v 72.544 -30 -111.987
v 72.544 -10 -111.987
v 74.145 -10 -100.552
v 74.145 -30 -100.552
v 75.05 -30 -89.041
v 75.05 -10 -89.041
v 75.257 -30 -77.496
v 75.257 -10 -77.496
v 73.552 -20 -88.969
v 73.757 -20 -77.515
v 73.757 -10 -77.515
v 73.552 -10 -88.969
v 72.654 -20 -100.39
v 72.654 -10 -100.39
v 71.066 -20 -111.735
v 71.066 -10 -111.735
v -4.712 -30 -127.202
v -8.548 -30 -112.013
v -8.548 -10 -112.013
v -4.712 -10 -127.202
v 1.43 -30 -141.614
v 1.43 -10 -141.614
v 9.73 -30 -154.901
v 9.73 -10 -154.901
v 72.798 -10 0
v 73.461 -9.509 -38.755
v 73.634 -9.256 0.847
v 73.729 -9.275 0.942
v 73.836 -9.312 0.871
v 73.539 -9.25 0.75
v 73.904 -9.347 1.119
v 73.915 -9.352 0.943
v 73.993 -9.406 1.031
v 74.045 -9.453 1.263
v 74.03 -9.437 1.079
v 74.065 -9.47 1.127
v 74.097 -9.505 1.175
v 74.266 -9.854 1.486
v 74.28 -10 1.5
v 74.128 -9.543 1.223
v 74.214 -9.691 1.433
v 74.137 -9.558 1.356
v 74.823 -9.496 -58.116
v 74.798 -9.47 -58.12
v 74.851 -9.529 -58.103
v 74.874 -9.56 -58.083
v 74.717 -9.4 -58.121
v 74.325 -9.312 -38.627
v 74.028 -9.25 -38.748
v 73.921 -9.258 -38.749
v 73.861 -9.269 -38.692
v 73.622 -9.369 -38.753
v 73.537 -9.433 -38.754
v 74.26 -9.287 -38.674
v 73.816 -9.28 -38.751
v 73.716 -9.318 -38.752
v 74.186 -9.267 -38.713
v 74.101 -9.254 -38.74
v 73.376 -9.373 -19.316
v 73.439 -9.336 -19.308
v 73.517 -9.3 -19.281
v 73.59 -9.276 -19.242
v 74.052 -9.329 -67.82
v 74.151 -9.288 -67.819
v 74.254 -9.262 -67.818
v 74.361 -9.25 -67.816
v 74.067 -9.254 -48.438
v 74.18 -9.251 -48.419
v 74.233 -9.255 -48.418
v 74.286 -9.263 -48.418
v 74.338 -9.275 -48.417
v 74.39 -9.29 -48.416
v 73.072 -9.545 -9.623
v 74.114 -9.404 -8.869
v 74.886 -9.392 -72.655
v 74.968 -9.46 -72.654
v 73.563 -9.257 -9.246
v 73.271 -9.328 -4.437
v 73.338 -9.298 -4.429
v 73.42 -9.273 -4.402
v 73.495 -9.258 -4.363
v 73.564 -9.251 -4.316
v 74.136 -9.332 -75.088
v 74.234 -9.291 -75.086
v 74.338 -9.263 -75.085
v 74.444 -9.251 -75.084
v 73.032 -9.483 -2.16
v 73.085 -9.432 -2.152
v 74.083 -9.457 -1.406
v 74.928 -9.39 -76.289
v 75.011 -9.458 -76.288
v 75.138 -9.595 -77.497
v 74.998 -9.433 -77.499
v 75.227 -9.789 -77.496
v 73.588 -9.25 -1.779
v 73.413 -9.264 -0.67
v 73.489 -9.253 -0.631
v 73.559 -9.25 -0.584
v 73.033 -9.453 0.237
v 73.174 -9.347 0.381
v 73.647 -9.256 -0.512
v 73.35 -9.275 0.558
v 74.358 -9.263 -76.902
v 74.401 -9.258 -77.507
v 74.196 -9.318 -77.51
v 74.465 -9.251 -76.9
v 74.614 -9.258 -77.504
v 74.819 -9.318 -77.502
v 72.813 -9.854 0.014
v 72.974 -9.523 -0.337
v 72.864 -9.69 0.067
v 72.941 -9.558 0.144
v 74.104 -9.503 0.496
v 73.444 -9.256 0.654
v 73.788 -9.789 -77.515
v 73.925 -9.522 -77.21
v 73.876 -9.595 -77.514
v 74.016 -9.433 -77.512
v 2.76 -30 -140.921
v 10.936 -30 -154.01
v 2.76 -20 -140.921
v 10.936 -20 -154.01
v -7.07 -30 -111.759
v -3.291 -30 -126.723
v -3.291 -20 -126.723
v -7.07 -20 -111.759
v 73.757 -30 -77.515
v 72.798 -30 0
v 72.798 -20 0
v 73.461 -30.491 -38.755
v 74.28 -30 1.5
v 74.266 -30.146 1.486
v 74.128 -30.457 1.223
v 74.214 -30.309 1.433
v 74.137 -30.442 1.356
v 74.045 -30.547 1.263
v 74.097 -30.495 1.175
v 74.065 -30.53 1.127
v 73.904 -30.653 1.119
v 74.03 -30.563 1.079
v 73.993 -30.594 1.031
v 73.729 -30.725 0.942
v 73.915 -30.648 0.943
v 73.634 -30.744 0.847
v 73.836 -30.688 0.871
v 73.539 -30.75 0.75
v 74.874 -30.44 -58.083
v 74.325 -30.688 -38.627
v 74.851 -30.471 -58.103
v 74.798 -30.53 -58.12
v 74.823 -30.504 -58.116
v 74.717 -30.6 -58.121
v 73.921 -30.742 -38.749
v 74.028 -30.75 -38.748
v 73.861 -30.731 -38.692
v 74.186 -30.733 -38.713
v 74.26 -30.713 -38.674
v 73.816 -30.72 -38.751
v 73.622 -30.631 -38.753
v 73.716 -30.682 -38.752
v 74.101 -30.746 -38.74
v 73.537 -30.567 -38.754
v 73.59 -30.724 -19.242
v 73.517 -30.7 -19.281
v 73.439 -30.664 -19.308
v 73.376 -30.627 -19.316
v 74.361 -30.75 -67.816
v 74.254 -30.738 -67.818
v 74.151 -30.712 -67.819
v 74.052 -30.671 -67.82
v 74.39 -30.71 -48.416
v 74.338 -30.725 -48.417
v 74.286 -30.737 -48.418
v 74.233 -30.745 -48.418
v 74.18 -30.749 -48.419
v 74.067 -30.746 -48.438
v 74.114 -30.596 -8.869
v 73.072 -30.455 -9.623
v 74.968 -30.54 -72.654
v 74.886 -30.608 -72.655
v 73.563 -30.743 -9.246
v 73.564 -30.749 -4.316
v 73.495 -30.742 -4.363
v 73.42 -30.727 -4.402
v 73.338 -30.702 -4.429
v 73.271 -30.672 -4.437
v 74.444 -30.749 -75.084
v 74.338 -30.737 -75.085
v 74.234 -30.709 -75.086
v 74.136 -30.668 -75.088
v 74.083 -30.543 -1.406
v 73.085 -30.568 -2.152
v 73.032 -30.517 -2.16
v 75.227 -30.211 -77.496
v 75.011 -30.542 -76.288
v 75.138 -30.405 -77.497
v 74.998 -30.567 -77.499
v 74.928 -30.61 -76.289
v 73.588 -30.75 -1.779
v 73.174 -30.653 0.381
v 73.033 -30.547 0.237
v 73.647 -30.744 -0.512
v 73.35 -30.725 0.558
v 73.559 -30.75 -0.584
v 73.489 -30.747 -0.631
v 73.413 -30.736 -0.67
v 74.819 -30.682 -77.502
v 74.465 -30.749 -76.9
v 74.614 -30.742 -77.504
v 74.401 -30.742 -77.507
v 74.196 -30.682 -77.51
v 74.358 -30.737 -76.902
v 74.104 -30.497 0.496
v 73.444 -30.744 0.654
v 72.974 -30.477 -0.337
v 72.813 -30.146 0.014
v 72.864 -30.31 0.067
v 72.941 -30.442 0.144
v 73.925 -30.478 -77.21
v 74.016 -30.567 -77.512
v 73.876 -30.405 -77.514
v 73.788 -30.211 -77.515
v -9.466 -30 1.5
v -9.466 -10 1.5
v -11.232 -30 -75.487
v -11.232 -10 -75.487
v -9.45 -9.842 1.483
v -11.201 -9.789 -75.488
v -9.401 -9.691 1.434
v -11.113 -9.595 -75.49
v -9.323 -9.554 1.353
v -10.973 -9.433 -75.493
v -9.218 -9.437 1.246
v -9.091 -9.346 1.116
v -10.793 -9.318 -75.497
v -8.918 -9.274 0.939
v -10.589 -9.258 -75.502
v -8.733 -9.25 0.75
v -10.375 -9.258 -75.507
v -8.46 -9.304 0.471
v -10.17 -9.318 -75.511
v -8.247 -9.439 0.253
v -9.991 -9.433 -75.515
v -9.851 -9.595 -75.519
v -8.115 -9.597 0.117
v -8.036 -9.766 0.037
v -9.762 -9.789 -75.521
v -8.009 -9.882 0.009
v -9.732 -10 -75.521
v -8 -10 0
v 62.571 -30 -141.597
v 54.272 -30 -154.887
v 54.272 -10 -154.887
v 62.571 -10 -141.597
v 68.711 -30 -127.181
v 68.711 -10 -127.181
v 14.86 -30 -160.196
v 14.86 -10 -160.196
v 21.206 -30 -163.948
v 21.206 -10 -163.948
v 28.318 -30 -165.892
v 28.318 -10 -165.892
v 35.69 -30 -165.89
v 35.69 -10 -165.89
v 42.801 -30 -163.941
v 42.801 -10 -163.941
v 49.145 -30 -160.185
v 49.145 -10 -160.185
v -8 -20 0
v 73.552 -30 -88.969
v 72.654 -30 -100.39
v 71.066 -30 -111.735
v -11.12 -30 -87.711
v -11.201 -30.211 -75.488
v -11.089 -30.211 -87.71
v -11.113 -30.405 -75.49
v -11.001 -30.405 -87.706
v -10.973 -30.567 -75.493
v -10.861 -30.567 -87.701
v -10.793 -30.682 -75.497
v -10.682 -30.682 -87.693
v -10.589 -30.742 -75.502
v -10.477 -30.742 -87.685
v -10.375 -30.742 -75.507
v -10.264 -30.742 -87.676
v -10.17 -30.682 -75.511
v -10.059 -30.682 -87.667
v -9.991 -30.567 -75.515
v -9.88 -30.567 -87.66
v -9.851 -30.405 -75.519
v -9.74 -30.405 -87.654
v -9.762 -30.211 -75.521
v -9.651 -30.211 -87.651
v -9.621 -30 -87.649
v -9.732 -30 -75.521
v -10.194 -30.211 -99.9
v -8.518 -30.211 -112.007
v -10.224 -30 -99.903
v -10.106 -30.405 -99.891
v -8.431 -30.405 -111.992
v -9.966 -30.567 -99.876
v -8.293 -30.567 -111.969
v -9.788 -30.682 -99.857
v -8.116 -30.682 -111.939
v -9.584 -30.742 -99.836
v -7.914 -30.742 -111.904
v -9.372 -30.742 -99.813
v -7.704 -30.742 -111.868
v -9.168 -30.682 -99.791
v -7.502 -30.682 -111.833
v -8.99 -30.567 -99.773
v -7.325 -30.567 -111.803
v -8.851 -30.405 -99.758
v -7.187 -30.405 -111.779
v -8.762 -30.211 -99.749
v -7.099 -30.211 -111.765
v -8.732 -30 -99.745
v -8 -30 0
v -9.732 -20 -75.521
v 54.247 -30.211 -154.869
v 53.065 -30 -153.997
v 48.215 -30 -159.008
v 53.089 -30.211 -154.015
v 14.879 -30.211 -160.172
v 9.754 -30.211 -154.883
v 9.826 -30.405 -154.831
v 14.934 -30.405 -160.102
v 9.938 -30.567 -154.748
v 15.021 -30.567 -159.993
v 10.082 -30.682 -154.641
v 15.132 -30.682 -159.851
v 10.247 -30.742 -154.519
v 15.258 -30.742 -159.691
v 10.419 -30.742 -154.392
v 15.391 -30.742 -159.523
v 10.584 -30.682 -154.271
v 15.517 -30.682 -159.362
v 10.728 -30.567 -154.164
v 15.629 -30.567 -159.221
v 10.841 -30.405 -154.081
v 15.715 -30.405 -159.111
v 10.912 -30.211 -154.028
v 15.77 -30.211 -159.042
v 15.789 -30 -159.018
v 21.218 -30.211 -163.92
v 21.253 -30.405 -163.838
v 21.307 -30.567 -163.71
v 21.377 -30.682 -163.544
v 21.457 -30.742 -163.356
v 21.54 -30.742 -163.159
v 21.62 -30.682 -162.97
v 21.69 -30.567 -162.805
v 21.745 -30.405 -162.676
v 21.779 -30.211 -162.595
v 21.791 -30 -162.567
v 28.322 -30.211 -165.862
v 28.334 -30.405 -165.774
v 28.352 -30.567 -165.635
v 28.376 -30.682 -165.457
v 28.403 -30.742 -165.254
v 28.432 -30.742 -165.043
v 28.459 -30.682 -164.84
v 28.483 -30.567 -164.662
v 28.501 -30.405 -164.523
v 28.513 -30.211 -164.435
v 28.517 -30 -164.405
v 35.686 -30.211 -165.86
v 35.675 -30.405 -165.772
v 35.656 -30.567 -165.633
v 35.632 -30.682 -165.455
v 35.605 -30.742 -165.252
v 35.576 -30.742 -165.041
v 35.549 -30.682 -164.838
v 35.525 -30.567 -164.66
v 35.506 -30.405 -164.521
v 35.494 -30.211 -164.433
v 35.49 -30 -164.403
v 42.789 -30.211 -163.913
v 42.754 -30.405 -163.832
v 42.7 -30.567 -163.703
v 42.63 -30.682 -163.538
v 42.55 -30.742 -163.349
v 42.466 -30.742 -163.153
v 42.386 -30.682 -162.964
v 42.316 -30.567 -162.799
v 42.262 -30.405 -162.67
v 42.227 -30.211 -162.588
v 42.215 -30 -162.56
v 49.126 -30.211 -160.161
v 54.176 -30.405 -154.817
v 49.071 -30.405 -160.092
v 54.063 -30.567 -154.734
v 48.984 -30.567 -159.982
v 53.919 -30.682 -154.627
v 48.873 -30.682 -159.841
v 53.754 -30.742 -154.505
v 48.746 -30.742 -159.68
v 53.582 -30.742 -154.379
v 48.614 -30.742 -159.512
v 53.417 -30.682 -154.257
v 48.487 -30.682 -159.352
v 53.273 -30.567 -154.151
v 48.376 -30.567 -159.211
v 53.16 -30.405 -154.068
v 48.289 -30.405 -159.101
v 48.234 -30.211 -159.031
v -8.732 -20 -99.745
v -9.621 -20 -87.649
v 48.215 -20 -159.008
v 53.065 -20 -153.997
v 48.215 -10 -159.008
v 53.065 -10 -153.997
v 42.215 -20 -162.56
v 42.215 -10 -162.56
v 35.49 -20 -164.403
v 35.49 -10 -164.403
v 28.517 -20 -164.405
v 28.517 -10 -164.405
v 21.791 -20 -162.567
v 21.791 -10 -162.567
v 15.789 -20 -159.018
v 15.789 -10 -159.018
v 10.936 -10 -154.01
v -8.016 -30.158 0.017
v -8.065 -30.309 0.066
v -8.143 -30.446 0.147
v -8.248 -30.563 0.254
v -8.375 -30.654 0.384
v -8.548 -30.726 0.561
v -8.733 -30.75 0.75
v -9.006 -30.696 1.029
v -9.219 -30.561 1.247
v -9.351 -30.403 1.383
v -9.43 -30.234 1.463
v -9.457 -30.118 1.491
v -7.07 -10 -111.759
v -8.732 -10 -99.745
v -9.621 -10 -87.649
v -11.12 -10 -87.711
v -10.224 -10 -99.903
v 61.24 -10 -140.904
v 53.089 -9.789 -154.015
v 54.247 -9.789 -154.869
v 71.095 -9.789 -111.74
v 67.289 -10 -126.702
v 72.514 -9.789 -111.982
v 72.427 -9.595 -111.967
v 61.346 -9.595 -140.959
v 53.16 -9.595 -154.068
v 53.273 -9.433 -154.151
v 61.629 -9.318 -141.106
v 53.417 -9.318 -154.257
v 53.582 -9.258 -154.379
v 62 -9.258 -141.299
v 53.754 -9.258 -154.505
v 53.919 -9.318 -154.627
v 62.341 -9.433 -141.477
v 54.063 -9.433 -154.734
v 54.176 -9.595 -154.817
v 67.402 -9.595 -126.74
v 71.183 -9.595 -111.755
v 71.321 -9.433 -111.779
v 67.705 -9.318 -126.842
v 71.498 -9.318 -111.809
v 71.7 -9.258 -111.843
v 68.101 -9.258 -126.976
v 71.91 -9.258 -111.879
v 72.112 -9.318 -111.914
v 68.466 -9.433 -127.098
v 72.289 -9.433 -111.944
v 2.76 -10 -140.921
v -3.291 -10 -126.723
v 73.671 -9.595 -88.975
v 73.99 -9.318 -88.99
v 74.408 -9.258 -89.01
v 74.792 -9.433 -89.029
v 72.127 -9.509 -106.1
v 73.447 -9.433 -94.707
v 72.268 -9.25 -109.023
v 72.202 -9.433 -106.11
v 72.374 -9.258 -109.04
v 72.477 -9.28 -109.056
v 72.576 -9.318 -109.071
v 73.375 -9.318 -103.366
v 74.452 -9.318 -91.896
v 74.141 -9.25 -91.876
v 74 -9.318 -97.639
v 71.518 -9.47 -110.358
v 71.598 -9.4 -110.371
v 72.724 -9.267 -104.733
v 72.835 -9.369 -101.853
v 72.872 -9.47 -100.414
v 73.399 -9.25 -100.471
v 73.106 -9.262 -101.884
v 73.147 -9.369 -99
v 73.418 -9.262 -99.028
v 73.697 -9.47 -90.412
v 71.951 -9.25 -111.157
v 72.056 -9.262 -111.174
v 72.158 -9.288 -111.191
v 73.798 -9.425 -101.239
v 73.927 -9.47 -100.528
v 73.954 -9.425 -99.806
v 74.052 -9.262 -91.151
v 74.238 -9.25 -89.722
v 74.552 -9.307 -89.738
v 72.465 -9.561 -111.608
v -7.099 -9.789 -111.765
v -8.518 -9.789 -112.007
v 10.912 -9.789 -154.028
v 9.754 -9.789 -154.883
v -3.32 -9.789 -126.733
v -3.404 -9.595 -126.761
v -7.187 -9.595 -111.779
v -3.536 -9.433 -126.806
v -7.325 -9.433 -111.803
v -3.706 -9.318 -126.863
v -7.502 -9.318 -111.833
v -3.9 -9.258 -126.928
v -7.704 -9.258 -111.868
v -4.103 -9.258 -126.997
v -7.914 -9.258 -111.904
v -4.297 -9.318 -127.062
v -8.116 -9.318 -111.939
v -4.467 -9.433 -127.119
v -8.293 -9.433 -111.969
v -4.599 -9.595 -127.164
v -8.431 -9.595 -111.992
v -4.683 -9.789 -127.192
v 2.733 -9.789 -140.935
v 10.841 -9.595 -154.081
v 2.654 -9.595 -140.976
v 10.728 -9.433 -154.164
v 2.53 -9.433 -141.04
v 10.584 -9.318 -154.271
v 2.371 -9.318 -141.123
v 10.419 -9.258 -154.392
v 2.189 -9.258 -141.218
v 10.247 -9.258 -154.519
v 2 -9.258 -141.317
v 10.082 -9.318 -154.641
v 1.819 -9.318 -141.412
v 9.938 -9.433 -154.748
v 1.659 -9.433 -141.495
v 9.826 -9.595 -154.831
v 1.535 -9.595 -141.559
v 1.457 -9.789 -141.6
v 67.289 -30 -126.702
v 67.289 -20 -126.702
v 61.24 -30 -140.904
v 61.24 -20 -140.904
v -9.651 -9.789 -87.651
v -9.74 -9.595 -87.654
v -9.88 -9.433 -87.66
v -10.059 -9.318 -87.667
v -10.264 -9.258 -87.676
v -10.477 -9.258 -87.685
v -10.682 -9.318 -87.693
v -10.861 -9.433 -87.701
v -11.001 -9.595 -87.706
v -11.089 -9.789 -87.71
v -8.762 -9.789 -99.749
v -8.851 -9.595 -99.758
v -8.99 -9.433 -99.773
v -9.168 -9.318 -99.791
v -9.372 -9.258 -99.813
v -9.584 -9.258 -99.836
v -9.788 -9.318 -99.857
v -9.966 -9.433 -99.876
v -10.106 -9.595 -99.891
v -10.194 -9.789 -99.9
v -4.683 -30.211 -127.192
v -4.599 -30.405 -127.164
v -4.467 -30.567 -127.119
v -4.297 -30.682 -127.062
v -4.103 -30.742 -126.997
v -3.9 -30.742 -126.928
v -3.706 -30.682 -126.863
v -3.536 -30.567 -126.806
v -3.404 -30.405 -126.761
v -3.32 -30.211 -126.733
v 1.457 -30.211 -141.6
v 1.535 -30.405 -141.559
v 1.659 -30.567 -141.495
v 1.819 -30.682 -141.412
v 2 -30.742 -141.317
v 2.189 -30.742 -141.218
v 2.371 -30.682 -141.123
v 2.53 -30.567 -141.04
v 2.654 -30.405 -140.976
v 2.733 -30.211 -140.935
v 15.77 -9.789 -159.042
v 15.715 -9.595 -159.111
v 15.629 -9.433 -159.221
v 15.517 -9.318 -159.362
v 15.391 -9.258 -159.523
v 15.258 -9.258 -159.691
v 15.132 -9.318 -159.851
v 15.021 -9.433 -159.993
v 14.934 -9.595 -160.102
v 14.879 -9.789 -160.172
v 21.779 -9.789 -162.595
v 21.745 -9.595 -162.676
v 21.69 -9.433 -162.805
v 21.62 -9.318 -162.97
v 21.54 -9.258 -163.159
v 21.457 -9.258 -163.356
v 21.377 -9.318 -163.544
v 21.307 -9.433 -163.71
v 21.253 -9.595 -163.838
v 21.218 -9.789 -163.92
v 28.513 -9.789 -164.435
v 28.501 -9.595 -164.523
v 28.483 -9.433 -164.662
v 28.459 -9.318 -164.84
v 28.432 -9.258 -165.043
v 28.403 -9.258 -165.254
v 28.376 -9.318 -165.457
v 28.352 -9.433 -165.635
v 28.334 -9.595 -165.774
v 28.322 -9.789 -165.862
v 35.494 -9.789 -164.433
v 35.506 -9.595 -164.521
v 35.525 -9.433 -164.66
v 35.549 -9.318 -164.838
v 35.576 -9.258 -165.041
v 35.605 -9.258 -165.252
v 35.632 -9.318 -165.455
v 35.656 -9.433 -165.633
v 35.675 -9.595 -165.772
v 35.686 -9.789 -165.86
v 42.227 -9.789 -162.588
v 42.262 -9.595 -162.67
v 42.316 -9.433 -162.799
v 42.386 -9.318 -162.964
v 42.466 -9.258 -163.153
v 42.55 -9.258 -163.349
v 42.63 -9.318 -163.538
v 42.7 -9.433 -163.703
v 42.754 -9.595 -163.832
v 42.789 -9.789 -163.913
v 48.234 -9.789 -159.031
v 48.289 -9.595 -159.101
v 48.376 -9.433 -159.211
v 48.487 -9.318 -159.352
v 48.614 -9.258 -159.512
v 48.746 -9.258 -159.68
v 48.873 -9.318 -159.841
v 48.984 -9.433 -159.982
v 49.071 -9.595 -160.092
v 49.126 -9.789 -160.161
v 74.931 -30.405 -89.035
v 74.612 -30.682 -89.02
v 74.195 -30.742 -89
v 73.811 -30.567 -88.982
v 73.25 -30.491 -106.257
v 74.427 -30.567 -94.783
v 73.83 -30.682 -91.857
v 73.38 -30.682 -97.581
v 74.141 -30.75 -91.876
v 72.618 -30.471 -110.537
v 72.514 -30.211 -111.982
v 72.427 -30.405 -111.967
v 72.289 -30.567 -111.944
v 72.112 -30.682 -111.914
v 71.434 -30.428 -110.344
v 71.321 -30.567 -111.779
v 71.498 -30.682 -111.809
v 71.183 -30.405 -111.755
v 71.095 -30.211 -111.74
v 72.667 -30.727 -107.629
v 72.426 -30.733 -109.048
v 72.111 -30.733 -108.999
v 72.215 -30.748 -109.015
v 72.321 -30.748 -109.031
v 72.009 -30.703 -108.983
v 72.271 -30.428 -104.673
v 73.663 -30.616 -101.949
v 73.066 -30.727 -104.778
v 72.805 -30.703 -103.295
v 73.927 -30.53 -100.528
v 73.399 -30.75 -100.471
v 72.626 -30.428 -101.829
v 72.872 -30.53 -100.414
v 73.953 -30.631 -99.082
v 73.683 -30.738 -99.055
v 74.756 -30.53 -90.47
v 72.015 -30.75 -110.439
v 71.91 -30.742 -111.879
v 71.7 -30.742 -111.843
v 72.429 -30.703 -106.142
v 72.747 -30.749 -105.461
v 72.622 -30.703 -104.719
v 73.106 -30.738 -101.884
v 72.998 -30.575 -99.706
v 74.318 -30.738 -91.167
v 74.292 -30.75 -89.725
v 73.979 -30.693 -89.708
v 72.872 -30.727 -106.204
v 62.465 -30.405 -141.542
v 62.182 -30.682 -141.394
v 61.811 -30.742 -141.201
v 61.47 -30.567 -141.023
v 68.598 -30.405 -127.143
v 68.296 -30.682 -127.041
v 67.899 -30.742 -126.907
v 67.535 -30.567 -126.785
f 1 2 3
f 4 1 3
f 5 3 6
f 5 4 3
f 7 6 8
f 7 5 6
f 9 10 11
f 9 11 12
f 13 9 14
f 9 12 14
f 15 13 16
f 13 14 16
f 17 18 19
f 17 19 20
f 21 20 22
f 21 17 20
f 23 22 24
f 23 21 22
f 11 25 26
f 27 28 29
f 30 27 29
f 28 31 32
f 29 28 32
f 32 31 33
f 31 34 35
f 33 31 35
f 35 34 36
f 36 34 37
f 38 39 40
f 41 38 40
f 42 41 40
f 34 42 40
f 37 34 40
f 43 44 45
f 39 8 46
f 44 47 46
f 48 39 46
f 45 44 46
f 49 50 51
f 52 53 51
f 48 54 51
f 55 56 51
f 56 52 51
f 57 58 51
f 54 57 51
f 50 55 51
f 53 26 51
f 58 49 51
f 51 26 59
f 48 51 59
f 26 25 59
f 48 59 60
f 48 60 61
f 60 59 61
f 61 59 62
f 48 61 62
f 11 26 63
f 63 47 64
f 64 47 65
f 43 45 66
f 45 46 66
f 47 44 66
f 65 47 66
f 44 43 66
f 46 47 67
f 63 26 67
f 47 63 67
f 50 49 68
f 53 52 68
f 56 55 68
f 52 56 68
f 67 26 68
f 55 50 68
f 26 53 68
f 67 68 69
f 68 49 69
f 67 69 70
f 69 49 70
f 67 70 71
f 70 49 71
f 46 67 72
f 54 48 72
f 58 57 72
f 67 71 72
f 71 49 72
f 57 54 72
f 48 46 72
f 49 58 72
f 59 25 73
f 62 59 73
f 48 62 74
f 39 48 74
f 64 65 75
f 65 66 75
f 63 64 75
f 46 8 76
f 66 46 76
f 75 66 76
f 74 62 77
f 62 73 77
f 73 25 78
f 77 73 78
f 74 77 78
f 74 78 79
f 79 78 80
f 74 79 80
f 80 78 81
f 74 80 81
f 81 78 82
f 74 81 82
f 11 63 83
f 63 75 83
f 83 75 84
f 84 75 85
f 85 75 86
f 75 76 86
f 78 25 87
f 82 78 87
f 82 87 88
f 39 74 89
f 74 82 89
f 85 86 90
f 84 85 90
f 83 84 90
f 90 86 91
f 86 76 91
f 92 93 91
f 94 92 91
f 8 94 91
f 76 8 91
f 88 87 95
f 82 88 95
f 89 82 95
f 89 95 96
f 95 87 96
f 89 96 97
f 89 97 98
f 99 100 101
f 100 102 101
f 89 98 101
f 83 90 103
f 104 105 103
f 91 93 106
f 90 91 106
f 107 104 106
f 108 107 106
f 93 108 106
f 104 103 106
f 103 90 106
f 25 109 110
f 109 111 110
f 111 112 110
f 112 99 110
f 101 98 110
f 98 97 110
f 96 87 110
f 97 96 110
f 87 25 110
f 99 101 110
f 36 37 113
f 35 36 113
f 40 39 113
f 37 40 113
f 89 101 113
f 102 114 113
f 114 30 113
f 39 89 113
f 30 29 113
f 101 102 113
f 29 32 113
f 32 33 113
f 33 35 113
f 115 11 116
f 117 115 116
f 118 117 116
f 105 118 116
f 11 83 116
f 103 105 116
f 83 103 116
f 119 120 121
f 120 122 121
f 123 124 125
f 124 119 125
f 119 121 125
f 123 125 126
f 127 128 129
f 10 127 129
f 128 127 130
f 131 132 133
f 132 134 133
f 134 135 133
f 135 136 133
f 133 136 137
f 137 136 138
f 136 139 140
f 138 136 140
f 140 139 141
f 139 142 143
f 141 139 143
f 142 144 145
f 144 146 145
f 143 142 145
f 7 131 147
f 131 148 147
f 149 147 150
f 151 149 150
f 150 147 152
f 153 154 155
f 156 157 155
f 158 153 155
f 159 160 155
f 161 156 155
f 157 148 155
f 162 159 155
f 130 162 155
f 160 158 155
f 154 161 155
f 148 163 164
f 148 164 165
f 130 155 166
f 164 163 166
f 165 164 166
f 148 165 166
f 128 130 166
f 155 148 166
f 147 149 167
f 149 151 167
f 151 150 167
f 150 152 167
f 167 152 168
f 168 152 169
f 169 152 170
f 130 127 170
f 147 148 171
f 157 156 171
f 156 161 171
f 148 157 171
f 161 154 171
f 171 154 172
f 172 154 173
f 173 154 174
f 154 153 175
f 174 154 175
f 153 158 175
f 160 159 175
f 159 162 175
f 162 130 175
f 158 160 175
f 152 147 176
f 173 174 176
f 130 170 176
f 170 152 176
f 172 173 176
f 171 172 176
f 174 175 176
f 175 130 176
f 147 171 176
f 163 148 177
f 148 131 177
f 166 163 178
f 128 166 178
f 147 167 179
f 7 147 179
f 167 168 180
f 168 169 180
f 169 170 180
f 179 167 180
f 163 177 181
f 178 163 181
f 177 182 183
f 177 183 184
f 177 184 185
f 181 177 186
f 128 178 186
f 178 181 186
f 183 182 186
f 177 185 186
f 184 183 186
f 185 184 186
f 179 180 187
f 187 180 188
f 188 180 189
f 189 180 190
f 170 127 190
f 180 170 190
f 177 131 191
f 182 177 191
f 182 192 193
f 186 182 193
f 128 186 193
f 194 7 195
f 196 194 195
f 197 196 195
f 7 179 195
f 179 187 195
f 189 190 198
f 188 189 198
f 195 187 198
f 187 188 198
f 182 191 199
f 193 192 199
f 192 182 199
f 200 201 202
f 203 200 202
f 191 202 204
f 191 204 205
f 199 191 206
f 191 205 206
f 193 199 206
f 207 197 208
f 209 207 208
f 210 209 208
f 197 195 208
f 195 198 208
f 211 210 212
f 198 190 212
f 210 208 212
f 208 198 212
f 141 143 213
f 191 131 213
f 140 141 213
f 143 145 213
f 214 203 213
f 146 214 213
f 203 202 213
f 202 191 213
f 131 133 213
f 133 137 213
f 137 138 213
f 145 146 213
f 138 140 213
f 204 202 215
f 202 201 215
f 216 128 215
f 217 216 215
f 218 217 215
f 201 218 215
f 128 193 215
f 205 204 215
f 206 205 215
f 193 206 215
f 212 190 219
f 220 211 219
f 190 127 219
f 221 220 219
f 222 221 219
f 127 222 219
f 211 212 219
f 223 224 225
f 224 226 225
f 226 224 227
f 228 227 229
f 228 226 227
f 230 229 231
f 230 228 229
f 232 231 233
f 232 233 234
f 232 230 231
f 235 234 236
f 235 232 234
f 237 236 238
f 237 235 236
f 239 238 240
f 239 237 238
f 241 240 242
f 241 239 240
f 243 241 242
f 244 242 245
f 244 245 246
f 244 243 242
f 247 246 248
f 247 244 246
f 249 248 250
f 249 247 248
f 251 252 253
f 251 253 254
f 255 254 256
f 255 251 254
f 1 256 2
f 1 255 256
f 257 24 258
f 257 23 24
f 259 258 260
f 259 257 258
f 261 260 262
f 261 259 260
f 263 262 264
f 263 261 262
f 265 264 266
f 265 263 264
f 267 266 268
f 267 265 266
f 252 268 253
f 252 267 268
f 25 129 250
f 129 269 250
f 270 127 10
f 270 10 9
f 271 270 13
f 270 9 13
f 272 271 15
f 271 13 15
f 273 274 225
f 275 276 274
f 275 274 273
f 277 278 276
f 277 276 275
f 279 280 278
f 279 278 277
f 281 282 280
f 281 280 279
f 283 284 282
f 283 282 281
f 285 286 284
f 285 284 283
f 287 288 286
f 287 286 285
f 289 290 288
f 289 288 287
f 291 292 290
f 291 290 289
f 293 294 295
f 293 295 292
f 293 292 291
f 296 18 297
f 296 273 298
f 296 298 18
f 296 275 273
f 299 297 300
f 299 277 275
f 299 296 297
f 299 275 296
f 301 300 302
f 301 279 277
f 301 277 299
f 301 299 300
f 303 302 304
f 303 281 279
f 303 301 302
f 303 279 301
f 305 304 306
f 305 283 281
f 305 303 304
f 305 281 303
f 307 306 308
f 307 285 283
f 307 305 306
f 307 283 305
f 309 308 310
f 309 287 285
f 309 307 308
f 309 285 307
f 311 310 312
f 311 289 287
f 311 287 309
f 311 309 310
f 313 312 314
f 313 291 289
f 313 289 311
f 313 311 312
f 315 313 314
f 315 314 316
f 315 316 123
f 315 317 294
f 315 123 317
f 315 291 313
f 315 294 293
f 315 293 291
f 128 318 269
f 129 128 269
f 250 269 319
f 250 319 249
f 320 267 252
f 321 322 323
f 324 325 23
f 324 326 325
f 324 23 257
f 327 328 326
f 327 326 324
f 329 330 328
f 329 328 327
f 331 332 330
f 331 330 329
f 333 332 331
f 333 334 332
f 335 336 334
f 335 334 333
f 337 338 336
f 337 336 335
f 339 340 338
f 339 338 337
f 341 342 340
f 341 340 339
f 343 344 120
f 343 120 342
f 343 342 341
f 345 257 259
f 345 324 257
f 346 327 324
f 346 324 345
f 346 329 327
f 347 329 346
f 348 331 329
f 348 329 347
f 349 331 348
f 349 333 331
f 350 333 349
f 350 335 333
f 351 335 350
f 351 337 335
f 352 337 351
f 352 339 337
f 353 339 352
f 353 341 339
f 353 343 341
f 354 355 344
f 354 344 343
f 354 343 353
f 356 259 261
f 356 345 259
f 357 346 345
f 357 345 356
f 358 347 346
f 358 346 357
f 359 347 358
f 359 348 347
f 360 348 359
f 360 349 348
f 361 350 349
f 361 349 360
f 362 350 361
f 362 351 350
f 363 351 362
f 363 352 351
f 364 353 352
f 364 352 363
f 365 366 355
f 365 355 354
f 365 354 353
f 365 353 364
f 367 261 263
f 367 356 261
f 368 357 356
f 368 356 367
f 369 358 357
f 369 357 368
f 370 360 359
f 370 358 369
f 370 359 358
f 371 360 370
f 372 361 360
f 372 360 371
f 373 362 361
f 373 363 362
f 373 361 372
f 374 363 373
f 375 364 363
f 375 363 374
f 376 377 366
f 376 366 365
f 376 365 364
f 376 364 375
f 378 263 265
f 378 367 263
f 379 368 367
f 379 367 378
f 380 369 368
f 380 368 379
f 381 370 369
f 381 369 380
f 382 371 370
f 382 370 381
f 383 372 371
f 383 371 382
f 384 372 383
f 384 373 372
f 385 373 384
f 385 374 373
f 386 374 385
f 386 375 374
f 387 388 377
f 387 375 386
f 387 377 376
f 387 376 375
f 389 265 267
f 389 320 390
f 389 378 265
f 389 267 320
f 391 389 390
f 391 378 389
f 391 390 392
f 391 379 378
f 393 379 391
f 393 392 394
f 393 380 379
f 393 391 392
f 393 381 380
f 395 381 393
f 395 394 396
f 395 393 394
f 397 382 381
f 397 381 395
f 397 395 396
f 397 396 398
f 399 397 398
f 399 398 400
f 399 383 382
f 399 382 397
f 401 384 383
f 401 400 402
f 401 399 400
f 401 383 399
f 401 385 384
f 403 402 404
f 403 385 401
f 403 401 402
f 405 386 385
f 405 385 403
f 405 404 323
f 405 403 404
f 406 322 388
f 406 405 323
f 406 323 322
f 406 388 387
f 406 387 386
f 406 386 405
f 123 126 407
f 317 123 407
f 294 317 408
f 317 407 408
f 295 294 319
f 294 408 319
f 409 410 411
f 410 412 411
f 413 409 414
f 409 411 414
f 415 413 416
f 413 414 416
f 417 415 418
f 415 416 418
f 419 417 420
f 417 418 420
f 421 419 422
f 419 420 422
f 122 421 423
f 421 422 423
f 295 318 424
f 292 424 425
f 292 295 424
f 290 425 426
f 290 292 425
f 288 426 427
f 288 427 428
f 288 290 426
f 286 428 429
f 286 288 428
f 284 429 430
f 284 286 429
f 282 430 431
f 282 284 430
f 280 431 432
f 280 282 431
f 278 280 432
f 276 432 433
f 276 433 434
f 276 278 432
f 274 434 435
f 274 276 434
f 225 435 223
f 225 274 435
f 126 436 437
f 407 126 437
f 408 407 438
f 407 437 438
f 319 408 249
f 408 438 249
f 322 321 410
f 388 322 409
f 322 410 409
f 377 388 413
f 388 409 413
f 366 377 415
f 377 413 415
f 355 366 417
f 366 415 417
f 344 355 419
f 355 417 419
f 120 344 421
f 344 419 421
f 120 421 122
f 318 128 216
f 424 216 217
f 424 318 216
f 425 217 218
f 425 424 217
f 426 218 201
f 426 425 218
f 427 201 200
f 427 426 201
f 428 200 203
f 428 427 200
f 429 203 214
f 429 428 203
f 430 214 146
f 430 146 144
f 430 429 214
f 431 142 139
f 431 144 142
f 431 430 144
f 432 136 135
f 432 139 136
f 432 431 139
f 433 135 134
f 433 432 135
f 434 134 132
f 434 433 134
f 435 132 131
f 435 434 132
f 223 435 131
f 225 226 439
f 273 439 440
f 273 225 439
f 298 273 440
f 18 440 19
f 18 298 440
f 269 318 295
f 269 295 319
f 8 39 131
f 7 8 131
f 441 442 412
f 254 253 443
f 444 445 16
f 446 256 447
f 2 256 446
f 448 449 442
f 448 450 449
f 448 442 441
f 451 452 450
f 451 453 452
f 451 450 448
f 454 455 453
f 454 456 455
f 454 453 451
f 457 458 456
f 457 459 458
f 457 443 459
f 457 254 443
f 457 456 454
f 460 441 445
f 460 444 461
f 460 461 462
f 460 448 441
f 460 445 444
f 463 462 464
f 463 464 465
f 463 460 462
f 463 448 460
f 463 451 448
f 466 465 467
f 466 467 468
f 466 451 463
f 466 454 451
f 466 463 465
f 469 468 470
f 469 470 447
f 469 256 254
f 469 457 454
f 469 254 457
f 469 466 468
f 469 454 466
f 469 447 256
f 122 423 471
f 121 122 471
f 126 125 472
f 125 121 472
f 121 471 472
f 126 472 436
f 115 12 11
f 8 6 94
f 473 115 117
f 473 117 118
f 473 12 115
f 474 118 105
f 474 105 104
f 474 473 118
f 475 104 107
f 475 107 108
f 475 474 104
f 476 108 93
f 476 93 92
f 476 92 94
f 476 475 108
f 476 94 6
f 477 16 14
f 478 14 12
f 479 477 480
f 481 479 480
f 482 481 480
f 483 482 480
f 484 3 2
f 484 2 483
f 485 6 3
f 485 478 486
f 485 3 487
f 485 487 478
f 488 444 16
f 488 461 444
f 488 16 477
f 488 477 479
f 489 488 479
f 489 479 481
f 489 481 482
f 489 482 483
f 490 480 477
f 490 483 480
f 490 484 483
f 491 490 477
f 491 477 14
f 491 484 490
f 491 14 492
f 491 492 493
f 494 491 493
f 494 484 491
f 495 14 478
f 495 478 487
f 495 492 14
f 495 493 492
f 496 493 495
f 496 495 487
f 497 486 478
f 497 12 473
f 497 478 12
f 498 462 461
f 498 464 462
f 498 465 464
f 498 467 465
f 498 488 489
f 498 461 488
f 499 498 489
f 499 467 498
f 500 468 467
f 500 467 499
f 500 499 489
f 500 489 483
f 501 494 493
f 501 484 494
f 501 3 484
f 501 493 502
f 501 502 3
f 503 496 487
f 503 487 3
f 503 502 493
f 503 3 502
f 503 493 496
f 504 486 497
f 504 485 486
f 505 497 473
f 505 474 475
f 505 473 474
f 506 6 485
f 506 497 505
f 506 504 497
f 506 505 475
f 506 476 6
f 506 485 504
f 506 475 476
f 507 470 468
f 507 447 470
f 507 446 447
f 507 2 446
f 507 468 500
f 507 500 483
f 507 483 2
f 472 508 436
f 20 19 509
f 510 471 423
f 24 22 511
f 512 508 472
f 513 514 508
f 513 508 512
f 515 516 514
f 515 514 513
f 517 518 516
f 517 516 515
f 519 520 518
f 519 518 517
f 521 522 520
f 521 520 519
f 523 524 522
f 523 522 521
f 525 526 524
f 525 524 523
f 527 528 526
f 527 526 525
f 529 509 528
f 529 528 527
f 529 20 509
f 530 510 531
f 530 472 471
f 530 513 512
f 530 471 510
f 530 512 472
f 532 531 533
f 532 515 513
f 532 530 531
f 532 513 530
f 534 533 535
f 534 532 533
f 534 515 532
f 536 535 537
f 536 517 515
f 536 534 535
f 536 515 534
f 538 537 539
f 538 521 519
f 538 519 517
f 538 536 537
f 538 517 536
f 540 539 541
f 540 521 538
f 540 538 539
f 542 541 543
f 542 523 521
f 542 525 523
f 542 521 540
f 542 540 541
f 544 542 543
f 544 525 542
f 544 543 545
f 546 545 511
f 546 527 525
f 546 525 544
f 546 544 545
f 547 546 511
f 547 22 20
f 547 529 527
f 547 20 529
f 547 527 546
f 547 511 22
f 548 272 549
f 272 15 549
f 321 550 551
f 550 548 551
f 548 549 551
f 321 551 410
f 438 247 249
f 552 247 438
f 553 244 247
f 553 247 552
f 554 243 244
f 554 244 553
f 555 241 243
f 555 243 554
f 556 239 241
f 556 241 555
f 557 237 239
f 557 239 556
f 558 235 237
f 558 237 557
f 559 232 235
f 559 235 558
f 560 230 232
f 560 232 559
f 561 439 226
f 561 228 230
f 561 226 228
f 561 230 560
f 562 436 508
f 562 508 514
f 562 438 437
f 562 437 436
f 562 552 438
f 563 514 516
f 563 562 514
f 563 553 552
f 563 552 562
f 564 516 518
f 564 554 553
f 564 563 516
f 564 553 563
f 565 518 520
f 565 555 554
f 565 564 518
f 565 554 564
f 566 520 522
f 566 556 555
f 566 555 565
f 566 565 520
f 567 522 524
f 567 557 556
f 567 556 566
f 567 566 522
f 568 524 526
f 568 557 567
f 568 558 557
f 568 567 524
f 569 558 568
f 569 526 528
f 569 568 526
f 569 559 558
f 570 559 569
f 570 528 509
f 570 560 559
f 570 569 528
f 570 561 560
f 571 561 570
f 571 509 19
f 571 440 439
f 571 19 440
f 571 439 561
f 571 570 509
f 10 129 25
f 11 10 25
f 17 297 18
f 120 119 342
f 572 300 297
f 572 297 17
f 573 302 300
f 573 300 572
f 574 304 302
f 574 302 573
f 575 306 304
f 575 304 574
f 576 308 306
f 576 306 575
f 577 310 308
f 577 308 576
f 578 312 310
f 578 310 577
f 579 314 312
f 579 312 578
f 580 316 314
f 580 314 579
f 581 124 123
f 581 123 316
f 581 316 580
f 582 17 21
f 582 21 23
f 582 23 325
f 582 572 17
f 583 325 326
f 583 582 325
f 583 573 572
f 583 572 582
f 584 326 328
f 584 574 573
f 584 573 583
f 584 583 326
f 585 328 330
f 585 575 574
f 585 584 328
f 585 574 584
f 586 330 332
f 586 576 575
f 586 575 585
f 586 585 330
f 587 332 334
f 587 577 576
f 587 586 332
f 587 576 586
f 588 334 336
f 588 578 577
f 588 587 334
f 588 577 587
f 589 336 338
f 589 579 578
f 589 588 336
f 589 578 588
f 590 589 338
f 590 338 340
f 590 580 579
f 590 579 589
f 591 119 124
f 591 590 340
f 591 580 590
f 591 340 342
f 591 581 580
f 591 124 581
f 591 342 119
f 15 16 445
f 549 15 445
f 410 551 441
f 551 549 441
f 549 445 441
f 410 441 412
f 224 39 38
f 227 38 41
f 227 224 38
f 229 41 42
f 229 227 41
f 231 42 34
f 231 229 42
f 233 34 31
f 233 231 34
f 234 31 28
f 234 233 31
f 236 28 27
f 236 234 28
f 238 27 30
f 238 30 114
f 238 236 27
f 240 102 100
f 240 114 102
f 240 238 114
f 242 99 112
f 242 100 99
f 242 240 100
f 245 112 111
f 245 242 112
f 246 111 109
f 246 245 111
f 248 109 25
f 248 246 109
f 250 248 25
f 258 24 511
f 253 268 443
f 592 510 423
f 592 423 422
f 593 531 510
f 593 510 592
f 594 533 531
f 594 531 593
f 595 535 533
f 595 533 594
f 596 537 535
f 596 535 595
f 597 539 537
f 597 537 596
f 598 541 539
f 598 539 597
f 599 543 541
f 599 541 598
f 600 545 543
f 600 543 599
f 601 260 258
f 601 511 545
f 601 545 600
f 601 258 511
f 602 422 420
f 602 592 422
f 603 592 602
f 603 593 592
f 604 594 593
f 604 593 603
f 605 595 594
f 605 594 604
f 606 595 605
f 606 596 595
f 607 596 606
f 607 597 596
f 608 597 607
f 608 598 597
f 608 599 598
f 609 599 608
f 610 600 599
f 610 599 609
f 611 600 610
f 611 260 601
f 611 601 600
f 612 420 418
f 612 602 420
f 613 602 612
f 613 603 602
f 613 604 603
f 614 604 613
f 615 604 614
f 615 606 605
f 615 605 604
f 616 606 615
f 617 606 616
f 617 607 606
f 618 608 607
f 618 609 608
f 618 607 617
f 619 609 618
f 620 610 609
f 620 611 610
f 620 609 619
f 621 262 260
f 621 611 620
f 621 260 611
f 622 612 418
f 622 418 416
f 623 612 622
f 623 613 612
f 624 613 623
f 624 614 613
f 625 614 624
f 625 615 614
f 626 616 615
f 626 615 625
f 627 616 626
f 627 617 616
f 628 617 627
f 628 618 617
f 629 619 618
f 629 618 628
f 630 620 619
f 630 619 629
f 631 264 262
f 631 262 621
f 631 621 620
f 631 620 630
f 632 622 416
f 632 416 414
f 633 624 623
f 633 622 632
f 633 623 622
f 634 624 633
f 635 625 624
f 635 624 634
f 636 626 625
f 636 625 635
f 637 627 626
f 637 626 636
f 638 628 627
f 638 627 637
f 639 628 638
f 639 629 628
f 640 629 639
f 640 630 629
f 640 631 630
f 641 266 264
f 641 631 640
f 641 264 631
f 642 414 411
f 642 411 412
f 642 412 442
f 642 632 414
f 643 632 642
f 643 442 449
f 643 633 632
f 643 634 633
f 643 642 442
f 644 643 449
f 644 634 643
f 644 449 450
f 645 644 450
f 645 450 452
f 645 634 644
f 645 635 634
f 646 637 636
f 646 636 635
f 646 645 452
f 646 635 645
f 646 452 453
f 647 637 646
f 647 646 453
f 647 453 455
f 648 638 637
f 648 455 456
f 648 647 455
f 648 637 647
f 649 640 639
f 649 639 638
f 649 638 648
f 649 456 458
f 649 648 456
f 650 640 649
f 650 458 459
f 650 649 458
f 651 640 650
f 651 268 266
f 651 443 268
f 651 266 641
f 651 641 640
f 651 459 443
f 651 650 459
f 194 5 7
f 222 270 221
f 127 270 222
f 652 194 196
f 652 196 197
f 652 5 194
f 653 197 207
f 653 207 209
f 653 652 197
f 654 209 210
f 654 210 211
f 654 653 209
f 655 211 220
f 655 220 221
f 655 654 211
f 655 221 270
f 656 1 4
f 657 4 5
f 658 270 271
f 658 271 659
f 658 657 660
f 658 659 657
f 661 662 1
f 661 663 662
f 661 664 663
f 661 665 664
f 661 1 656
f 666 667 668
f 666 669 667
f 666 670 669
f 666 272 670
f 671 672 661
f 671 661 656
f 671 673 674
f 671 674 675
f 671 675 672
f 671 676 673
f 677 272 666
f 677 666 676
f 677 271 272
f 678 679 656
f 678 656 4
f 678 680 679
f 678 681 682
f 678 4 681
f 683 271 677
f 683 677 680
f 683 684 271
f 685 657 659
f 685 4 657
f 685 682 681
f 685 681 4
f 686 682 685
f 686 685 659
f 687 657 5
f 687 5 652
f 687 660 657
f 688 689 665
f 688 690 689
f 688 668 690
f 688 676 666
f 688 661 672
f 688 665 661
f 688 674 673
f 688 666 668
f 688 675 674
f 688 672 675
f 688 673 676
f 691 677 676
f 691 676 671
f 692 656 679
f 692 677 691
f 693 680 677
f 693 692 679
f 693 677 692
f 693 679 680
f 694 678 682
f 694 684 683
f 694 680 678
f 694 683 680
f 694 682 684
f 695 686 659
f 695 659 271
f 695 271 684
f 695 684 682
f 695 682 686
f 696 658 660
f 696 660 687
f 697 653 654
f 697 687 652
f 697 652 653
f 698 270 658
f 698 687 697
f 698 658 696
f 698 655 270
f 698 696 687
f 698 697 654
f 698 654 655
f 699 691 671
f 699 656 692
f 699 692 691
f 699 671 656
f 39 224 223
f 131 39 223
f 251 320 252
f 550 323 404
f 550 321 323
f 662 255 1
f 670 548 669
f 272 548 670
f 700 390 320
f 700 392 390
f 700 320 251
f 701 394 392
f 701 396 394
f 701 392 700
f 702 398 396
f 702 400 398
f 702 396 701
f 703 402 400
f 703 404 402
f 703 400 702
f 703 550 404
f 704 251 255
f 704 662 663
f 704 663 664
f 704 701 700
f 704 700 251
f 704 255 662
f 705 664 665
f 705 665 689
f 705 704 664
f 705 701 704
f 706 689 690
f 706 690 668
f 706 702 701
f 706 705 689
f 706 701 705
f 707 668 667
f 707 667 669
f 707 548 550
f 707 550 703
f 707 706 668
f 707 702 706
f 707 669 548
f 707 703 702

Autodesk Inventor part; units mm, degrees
ref_plane "YZ Plane" through (0, 0, 0) normal (1, 0, 0) x (0, 1, 0)
ref_plane "XZ Plane" through (0, 0, 0) normal (0, 1, 0) x (-1, 0, 0)
ref_plane "XY Plane" through (0, 0, 0) normal (0, 0, 1) x (1, 0, 0)
ref_plane "Work Plane1" through (0, -20, -46.550515) normal (0, -1, 0) x (1, 0, 0)
sketch "Sketch3" plane through (0, 0, 0) normal (1, 0, 0) x (0, 1, 0)
  line L0 (-10, 0.75) -> (-30, 0.75) construction
  line L1 (-10, 1.5) -> (-30, 1.5)
  line L2 (-30, 0) -> (-10, 0)
  arc A0 (-10, 0) -> (-10, 1.5) centre (-10, 0.75) ccw
  arc A1 (-30, 1.5) -> (-30, 0) centre (-30, 0.75) ccw
  line L3 (-20, 0) -> (-20, -75.521339)
  point P0 (0, 0)
  point P1 (-20, 0.75)
  dimension "d0" = 1.5
  dimension "d1" = 20
sketch "Sketch2" plane through (0, -20, -46.550515) normal (0, -1, 0) x (1, 0, 0)
  spline S0 degree 3 poles (10.936352, -107.459737) (7.179934, -102.68902) (4.033535, -97.51867) (-5.225152, -78.100329) (-8.2872, -62.427946) (-10.142521, -35.374288) (-9.704535, -25.423748) (-8.723403, -10.3087) (-7.774117, -1.15603) (-5.538946, 14.831288) (-5.181485, 16.030381) (-4.552811, 20.183892) (-4.390113, 22.146158) (-3.922153, 24.896569) (-3.697268, 25.872669) (-3.076393, 27.34097) (-2.721493, 27.87477) (-1.646581, 28.921839) (-1.096468, 29.286827) (-0.472504, 29.537585) knots -4.25223397 -4.25223397 -4.25223397 -4.25223397 -3.9562506 -3.9562506 -3.20358637 -3.20358637 -2.63296418 -2.63296418 -1.91340599 -1.91340599 -1.25108329 -1.25108329 -0.74740313 -0.74740313 -0.45018243 -0.45018243 -0.20171856 -0.20171856 0 0 0 0
  spline S1 degree 3 poles (-0.472504, 29.537585) (1.662997, 30.394784) (3.76326, 31.18858) (12.066295, 33.674511) (18.105231, 34.719852) (34.355163, 36.098659) (44.970674, 35.327004) (58.349341, 31.895929) (61.353799, 30.795493) (64.451791, 29.553471) knots -7.76000275 -7.76000275 -7.76000275 -7.76000275 -6.95943849 -6.95943849 -5.26298404 -5.26298404 -2.25628604 -2.25628604 -0.98996136 -0.98996136 -0.98996136 -0.98996136
  spline S2 degree 3 poles (64.451791, 29.553471) (64.8398, 29.397595) (65.202558, 29.19622) (65.889779, 28.69381) (66.202675, 28.396571) (67.033071, 27.417933) (67.345172, 26.774592) (68.217927, 24.021686) (68.397755, 21.252198) (68.956077, 17.339933) (69.095411, 16.833196) (70.788197, 6.497314) (71.779174, -1.55009) (73.836501, -23.43642) (74.335881, -37.059566) (71.775195, -64.13545) (69.136912, -76.833848) (61.279747, -95.276855) (57.62611, -101.65135) (53.064616, -107.446458) knots -16.54715867 -16.54715867 -16.54715867 -16.54715867 -16.22687828 -16.22687828 -15.89511657 -15.89511657 -15.24378739 -15.24378739 -13.58830962 -13.58830962 -12.65182165 -12.65182165 -10.37688693 -10.37688693 -6.01428586 -6.01428586 -2.21250171 -2.21250171 0 0 0 0
  line L0 (53.064616, -107.446458) -> (10.936352, -107.459737)
  line L1 (-8, 46.550515) -> (72.7983, 46.550515)
  line L2 (72.7983, 46.550515) -> (72.7983, 36.550515)
  line L3 (72.7983, 36.550515) -> (-8, 36.550515)
  line L4 (-8, 36.550515) -> (-8, 46.550515)
  line L5 (-8, 46.550515) -> (72.7983, 46.550515)
  line L6 (72.7983, 46.550515) -> (72.7983, 36.550515)
  arc A0 (71.065514, -65.184851) -> (73.757347, -30.964682) centre (-115.357252, -33.304478) ccw
  arc A1 (53.064616, -107.446458) -> (71.065514, -65.184851) centre (-26.86172, -48.438202) ccw
  line L7 (-8, 46.550515) -> (-9.732055, -28.970825)
  arc A2 (-9.732055, -28.970825) -> (-7.069542, -65.208874) centre (179.224539, -33.304478) ccw
  arc A3 (-7.069542, -65.208874) -> (10.936352, -107.459737) centre (90.85668, -48.438202) ccw
  arc A4 (10.936352, -107.459737) -> (53.064616, -107.446458) centre (31.995584, -91.907395) ccw
  line L8 (73.757347, -30.964682) -> (72.7983, 46.550515)
  point P0 (0, 46.550515)
  dimension "d2" = 84.98872
  dimension "d7" = 10
  dimension "d8" = 80.7983
  dimension "d9" = 6.99704
  dimension "d10" = 8
sweep "Sweep1" add profiles "Sketch3" path "Sketch2" path curves A3 A4 A1 A0 L8 L1 L7 A2
properties part number "Strap"
